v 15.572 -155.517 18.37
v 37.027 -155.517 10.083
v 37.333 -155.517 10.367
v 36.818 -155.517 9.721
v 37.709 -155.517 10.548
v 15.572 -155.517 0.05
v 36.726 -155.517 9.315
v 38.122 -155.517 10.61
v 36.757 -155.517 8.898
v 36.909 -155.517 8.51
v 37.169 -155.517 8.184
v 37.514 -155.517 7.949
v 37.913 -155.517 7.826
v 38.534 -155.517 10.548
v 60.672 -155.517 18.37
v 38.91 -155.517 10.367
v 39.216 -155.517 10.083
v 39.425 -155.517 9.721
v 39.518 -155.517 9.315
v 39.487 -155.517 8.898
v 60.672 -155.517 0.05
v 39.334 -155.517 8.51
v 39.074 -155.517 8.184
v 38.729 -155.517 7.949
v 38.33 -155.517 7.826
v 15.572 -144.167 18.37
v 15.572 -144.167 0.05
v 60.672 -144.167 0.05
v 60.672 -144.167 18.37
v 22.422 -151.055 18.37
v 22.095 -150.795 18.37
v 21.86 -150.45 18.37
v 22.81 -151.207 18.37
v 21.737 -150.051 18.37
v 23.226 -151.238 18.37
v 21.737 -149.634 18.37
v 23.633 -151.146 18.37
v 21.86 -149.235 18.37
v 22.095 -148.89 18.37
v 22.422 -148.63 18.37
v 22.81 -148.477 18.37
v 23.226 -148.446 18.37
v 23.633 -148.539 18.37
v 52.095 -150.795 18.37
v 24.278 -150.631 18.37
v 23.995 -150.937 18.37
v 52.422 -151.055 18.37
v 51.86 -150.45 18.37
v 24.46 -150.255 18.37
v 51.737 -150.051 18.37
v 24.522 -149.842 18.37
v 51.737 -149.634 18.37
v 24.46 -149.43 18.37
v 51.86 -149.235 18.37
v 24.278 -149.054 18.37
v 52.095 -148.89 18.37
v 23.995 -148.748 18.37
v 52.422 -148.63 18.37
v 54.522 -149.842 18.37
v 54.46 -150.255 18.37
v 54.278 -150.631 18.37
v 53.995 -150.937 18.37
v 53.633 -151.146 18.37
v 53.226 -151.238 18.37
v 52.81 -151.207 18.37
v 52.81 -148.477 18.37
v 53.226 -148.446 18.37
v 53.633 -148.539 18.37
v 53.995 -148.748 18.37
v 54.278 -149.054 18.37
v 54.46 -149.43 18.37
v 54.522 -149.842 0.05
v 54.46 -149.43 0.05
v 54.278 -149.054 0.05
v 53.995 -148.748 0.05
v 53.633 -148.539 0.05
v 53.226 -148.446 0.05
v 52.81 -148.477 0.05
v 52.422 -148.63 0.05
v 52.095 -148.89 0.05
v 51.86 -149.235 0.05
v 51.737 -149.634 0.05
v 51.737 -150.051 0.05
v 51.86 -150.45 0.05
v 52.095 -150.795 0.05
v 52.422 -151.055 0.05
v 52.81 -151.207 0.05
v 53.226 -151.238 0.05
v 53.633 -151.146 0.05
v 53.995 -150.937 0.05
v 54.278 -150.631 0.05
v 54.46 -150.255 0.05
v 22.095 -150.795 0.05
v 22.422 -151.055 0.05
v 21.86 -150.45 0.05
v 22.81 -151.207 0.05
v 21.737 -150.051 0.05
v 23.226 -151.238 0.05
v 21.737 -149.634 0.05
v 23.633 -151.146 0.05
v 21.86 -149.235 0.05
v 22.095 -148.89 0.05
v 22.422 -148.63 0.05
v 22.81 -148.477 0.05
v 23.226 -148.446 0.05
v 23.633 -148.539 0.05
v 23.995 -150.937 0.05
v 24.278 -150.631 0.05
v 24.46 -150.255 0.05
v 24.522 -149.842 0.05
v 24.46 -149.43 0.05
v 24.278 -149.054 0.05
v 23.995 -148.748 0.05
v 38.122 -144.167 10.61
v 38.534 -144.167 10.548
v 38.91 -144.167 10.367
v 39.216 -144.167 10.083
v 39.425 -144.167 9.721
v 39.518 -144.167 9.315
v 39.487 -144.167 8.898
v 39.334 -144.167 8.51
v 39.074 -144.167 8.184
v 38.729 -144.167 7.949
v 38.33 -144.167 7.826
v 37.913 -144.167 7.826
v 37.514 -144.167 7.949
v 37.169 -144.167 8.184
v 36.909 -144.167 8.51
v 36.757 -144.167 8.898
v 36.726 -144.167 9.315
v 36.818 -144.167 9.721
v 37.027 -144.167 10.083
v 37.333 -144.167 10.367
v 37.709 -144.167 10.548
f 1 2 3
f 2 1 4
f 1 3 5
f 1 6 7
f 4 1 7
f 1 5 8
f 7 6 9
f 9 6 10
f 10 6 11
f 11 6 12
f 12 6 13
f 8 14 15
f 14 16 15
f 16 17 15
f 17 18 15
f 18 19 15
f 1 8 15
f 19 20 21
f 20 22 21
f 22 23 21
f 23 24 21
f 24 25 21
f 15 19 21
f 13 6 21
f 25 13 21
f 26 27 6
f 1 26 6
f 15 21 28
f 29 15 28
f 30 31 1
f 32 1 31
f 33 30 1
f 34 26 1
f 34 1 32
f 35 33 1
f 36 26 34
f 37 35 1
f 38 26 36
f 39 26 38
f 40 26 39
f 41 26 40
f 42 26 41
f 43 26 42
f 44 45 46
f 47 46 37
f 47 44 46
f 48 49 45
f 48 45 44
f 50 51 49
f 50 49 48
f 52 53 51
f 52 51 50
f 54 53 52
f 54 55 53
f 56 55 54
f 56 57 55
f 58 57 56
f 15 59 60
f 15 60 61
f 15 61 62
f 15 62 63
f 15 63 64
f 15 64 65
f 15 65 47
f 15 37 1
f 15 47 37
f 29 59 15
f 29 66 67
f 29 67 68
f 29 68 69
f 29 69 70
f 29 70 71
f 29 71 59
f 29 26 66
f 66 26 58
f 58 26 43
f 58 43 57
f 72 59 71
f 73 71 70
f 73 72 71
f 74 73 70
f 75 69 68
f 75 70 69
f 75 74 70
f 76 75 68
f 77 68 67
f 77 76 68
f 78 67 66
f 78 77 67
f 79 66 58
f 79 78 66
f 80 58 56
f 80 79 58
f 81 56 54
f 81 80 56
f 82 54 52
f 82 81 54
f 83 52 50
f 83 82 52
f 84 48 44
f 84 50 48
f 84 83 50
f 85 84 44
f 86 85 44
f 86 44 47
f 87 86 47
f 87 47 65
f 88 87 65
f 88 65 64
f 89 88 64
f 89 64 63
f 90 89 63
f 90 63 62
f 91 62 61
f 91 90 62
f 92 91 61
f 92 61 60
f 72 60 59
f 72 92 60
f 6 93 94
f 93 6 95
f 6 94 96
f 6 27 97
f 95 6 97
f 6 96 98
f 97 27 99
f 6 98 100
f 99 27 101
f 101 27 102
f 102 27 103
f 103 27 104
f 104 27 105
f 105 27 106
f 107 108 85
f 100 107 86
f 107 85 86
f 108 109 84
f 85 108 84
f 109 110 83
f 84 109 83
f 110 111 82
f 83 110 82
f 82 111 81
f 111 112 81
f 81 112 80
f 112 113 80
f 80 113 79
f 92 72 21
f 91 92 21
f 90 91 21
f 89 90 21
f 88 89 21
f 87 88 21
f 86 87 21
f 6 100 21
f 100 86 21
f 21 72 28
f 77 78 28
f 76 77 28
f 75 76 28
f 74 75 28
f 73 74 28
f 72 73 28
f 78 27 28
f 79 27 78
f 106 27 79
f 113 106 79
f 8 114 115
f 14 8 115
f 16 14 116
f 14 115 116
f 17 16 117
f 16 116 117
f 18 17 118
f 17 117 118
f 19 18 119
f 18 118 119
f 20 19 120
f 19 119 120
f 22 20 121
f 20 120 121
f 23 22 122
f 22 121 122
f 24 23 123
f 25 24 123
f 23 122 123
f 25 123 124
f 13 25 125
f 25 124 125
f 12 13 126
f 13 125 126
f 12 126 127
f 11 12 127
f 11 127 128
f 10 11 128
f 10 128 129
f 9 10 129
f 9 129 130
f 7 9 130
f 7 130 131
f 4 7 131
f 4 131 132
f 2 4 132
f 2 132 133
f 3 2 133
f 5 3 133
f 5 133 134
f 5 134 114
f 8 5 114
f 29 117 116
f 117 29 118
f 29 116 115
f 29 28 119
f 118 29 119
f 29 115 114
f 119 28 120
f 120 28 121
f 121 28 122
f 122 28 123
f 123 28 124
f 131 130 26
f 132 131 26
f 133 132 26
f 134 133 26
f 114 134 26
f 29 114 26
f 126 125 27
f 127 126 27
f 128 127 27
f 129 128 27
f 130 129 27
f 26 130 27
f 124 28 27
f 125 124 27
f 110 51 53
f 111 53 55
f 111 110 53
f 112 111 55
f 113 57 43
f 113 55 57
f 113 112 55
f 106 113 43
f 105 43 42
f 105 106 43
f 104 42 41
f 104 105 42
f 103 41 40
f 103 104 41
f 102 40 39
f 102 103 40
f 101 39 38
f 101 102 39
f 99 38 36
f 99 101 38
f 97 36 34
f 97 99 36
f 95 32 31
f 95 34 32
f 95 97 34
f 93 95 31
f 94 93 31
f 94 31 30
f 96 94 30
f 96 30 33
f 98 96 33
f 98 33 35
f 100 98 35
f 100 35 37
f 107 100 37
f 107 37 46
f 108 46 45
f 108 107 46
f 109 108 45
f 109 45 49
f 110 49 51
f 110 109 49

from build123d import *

# Parameters (mm, degrees)
BOSS_EXTRUDE1_START     = 0.05
BOSS_EXTRUDE1_DEPTH     = 18.32
CUT_EXTRUDE1_DEPTH      = 168.935502816
CUT_EXTRUDE1_DEPTH_BACK = 168.935502816
SKETCH2_R               = 1.4
SKETCH3_R               = 1.4
CUT_EXTRUDE2_DEPTH      = 65.399803221


with BuildPart() as part:
    # Sketch1 → Boss-Extrude1 (new body)
    with BuildSketch(Plane.XY.offset(BOSS_EXTRUDE1_START)):
        Polygon((60.67170061, -154.017379901), (60.67170061, -144.167379901), (15.57170061, -144.167379901), (15.57170061, -154.017379901), (15.57170061, -155.517379901), (60.67170061, -155.517379901), align=None)
    extrude(amount=BOSS_EXTRUDE1_DEPTH)

    # Sketch2 → Cut-Extrude1 (cut, two sides: drawn at the far end of the back side and taken through both)
    with BuildSketch(Plane.XY.offset(18.37).offset(-CUT_EXTRUDE1_DEPTH_BACK)):
        with Locations((23.12170061, -149.842379901)):
            Circle(SKETCH2_R)
        with Locations((53.12170061, -149.842379901)):
            Circle(SKETCH2_R)
    extrude(amount=CUT_EXTRUDE1_DEPTH + CUT_EXTRUDE1_DEPTH_BACK, mode=Mode.SUBTRACT)

    # Sketch3 → Cut-Extrude2 (cut, through all)
    with BuildSketch(Plane(origin=(0, -144.167379901, 0), x_dir=(1, 0, 0), z_dir=(0, 1, 0))):
        with Locations(Location((38.12170061, -9.21, 0), (0, 0, 270))):
            Circle(SKETCH3_R)
    extrude(amount=-CUT_EXTRUDE2_DEPTH, mode=Mode.SUBTRACT)


solid = part.part
